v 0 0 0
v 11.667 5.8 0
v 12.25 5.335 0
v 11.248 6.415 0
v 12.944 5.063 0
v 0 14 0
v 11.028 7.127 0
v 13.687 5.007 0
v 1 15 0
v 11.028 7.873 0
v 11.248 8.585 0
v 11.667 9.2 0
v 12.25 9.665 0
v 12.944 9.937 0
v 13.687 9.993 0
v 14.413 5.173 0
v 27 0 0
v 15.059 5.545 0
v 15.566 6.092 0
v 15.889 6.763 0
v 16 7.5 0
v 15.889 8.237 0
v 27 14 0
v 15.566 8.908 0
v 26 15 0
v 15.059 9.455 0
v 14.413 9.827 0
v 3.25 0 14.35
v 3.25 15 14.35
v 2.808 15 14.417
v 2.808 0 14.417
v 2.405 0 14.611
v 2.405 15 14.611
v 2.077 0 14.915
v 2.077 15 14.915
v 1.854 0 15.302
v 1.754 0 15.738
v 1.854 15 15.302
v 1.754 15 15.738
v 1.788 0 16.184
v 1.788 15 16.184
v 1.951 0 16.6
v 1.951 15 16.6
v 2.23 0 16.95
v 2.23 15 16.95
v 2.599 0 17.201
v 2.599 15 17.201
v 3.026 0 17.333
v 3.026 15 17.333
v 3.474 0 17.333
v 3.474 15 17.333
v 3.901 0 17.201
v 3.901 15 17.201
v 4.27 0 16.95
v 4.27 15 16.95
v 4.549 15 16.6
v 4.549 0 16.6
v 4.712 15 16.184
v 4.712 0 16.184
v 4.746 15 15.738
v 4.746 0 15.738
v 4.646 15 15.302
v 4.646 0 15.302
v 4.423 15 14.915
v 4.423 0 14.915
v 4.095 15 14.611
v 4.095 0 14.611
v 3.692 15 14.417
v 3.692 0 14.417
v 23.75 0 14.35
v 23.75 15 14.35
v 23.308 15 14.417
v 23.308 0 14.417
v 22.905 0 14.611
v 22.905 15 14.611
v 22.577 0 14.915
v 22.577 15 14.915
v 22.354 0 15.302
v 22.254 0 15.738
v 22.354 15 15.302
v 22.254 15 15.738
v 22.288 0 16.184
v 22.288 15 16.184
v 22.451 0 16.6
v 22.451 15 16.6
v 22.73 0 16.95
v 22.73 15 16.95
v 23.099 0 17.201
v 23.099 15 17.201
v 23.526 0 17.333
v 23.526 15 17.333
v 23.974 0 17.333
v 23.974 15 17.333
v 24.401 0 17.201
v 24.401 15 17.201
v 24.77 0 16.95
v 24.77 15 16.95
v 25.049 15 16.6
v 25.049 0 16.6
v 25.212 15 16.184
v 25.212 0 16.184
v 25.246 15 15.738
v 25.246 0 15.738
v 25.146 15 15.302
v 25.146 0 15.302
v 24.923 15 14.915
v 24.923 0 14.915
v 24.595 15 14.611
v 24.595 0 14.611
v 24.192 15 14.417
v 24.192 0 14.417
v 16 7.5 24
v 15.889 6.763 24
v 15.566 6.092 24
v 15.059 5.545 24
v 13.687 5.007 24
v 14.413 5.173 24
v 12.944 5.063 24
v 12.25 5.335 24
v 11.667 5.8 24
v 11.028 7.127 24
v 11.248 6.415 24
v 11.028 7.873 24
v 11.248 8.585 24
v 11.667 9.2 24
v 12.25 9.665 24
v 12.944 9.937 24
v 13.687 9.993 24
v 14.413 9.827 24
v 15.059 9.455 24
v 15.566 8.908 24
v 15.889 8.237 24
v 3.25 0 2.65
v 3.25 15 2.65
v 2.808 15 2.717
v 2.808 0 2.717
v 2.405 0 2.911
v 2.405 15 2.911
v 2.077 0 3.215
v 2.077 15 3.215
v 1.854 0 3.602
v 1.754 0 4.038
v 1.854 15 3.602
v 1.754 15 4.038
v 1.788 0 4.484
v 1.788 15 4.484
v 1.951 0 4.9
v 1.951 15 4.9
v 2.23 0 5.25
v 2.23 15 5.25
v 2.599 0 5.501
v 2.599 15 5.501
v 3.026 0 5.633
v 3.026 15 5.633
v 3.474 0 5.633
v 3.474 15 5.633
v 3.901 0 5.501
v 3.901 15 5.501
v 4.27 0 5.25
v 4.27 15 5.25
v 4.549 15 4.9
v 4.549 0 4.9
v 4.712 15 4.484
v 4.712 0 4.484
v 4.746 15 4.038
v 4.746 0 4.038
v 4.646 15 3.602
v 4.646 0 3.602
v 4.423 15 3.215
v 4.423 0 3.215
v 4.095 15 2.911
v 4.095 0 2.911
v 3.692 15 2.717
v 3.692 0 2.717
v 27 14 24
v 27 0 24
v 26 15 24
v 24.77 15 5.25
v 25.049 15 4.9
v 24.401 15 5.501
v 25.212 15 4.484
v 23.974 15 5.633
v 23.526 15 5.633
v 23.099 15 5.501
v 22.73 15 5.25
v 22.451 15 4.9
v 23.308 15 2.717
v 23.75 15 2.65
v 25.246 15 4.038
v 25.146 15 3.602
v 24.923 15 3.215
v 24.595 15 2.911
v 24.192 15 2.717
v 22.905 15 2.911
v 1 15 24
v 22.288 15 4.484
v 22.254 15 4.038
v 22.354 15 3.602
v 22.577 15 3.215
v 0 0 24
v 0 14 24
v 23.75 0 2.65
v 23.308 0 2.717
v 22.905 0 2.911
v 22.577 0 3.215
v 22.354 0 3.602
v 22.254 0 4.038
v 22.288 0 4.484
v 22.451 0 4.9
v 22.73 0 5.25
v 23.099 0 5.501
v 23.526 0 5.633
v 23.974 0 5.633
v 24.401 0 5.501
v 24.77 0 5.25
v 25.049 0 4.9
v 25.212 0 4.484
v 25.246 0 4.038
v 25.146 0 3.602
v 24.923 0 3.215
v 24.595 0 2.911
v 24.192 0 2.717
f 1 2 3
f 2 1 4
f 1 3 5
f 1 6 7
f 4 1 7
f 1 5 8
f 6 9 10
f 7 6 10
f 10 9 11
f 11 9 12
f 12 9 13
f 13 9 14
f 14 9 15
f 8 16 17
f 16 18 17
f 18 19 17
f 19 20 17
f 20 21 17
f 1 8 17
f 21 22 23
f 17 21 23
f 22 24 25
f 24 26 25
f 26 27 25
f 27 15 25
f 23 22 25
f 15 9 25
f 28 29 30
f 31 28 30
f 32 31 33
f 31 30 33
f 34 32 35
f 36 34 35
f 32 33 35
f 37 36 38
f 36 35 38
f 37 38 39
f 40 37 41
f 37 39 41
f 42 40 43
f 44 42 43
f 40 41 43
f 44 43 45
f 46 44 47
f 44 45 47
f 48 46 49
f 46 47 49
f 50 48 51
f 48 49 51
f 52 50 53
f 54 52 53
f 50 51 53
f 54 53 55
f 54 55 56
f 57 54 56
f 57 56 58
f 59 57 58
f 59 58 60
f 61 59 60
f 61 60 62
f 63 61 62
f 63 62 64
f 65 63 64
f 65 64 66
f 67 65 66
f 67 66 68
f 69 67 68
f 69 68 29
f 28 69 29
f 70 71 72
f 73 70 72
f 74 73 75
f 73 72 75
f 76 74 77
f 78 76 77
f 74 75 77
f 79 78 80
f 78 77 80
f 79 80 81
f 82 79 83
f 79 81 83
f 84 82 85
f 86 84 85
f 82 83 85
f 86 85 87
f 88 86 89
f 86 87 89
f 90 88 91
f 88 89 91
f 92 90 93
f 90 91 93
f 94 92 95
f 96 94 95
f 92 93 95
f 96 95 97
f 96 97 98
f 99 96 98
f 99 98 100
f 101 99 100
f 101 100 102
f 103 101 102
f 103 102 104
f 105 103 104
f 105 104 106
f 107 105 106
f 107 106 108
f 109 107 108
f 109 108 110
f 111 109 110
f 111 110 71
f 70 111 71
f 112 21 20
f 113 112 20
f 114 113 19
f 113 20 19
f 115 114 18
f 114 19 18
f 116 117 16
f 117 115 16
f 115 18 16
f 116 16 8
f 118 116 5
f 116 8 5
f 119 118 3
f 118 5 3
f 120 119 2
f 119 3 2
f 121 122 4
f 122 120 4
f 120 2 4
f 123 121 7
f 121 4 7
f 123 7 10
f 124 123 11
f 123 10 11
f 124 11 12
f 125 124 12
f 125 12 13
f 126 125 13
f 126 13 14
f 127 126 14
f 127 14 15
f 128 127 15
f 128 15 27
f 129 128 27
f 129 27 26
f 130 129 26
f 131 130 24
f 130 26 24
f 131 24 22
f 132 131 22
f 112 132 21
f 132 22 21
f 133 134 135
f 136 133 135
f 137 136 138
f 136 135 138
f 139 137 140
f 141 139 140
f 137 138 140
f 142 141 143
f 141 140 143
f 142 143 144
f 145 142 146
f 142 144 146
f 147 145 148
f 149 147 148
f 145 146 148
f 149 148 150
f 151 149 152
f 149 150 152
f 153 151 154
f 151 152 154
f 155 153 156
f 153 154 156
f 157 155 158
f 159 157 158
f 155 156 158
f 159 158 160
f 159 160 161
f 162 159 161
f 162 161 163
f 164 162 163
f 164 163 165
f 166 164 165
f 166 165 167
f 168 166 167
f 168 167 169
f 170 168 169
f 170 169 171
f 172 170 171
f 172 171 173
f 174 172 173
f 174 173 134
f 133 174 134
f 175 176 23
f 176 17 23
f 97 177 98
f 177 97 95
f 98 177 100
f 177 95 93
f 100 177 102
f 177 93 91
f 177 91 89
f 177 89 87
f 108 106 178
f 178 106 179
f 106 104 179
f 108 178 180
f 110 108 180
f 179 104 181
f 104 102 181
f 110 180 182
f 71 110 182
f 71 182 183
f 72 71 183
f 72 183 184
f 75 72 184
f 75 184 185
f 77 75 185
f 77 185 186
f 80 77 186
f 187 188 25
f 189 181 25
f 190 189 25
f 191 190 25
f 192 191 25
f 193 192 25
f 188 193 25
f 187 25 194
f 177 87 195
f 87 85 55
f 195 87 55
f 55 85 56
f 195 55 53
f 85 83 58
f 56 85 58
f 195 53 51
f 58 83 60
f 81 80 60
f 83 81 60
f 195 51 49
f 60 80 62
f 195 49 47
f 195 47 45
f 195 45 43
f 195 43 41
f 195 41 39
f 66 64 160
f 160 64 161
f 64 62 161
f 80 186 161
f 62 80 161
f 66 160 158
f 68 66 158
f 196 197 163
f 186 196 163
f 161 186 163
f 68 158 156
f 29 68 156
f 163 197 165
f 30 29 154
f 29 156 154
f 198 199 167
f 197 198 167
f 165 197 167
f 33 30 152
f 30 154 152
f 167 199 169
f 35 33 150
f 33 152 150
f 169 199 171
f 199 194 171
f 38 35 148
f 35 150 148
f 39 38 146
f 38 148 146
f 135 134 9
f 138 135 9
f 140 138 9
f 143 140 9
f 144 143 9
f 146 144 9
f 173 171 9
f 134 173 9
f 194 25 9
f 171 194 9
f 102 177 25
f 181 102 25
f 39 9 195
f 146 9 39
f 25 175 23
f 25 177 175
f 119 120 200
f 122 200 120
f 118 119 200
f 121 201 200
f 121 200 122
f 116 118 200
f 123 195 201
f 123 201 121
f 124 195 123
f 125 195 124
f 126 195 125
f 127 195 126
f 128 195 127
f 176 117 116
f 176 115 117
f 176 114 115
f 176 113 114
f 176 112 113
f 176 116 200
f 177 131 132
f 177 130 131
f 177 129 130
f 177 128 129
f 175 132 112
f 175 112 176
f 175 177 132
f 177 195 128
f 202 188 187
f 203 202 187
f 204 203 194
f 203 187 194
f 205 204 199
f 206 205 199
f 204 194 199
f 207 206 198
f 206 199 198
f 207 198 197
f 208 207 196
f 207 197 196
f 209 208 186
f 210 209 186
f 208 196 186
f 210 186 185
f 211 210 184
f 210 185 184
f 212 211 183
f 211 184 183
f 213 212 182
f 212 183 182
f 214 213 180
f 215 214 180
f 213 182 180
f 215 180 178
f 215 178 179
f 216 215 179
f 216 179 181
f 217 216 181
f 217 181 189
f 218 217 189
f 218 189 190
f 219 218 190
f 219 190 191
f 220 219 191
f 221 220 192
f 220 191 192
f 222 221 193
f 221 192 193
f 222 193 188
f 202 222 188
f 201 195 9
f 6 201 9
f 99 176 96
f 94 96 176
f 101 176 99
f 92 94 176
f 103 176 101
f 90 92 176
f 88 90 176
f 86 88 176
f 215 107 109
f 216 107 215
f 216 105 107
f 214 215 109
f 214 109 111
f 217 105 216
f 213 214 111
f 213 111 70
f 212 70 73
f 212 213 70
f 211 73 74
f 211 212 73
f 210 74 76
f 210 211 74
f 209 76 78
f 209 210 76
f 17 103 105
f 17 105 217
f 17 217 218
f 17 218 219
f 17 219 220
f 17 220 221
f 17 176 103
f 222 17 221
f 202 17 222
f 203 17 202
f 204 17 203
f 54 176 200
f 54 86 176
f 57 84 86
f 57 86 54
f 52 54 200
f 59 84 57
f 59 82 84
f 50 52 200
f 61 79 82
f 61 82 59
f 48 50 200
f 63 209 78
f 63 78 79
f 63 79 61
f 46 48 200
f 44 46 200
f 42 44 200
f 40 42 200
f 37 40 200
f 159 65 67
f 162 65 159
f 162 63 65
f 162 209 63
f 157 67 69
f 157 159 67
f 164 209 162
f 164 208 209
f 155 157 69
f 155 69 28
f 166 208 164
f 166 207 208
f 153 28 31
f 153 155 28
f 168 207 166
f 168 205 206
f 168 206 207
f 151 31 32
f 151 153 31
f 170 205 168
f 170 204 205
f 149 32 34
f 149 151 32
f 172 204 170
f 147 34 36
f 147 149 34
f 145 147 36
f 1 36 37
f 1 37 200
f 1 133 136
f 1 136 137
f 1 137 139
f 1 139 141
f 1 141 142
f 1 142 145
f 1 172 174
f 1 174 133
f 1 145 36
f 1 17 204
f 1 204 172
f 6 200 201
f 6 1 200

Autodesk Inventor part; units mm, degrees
ref_plane "YZ Plane" through (0, 0, 0) normal (1, 0, 0) x (0, 1, 0)
ref_plane "XZ Plane" through (0, 0, 0) normal (0, 1, 0) x (-1, 0, 0)
ref_plane "XY Plane" through (0, 0, 0) normal (0, 0, 1) x (1, 0, 0)
sketch "Szkic1" plane through (0, 0, 0) normal (0, 0, 1) x (1, 0, 0)
  line L0 (27, 15) -> (0, 15)
  line L1 (0, 0) -> (0, 15)
  line L2 (27, 0) -> (0, 0)
  line L3 (27, 0) -> (27, 15)
  circle A0 centre (13.5, 7.5) radius 2.5
  point P0 (27, 22.2042)
  dimension "d0" = 27
  dimension "d1" = 15
  dimension "d2" = 7.5
  dimension "d3" = 13.5
extrude "Wyciągnięcie proste1" add sketch "Szkic1" along normal blind 24
chamfer "Faza1" distance 1 angle 45 2 edges at (27, 15, 12) (0, 15, 12)
sketch "Szkic4" plane through (0, 0, 0) normal (0, -1, 0) x (1, 0, 0)
  line L0 (0, 0) -> (27, 0) projected
  line L1 (27, 0) -> (27, 24) projected
  line L2 (0, 24) -> (27, 24) projected
  line L3 (0, 0) -> (0, 24) projected
  point P0 (3.25, 4.15)
  point P1 (3.25, 15.85)
  point P2 (23.75, 4.15)
  point P3 (23.75, 15.85)
  dimension "d9" = 20.5
  dimension "d10" = 11.7
  dimension "d11" = 4.15
  dimension "d12" = 27
  dimension "d13" = 3.25
hole "Otwór1" at (3.25, 0, 4.15) at (3.25, 0, 15.85) at (23.75, 0, 4.15) at (23.75, 0, 15.85) direction (0, 1, 0) diameter 3 end through all
equation "\"d13\" = -0.5 * d9 + 0.5 * d12"
properties part number "3DP_ABS_Y_Axis_Tenioning_System_C_Sec_Filler"
